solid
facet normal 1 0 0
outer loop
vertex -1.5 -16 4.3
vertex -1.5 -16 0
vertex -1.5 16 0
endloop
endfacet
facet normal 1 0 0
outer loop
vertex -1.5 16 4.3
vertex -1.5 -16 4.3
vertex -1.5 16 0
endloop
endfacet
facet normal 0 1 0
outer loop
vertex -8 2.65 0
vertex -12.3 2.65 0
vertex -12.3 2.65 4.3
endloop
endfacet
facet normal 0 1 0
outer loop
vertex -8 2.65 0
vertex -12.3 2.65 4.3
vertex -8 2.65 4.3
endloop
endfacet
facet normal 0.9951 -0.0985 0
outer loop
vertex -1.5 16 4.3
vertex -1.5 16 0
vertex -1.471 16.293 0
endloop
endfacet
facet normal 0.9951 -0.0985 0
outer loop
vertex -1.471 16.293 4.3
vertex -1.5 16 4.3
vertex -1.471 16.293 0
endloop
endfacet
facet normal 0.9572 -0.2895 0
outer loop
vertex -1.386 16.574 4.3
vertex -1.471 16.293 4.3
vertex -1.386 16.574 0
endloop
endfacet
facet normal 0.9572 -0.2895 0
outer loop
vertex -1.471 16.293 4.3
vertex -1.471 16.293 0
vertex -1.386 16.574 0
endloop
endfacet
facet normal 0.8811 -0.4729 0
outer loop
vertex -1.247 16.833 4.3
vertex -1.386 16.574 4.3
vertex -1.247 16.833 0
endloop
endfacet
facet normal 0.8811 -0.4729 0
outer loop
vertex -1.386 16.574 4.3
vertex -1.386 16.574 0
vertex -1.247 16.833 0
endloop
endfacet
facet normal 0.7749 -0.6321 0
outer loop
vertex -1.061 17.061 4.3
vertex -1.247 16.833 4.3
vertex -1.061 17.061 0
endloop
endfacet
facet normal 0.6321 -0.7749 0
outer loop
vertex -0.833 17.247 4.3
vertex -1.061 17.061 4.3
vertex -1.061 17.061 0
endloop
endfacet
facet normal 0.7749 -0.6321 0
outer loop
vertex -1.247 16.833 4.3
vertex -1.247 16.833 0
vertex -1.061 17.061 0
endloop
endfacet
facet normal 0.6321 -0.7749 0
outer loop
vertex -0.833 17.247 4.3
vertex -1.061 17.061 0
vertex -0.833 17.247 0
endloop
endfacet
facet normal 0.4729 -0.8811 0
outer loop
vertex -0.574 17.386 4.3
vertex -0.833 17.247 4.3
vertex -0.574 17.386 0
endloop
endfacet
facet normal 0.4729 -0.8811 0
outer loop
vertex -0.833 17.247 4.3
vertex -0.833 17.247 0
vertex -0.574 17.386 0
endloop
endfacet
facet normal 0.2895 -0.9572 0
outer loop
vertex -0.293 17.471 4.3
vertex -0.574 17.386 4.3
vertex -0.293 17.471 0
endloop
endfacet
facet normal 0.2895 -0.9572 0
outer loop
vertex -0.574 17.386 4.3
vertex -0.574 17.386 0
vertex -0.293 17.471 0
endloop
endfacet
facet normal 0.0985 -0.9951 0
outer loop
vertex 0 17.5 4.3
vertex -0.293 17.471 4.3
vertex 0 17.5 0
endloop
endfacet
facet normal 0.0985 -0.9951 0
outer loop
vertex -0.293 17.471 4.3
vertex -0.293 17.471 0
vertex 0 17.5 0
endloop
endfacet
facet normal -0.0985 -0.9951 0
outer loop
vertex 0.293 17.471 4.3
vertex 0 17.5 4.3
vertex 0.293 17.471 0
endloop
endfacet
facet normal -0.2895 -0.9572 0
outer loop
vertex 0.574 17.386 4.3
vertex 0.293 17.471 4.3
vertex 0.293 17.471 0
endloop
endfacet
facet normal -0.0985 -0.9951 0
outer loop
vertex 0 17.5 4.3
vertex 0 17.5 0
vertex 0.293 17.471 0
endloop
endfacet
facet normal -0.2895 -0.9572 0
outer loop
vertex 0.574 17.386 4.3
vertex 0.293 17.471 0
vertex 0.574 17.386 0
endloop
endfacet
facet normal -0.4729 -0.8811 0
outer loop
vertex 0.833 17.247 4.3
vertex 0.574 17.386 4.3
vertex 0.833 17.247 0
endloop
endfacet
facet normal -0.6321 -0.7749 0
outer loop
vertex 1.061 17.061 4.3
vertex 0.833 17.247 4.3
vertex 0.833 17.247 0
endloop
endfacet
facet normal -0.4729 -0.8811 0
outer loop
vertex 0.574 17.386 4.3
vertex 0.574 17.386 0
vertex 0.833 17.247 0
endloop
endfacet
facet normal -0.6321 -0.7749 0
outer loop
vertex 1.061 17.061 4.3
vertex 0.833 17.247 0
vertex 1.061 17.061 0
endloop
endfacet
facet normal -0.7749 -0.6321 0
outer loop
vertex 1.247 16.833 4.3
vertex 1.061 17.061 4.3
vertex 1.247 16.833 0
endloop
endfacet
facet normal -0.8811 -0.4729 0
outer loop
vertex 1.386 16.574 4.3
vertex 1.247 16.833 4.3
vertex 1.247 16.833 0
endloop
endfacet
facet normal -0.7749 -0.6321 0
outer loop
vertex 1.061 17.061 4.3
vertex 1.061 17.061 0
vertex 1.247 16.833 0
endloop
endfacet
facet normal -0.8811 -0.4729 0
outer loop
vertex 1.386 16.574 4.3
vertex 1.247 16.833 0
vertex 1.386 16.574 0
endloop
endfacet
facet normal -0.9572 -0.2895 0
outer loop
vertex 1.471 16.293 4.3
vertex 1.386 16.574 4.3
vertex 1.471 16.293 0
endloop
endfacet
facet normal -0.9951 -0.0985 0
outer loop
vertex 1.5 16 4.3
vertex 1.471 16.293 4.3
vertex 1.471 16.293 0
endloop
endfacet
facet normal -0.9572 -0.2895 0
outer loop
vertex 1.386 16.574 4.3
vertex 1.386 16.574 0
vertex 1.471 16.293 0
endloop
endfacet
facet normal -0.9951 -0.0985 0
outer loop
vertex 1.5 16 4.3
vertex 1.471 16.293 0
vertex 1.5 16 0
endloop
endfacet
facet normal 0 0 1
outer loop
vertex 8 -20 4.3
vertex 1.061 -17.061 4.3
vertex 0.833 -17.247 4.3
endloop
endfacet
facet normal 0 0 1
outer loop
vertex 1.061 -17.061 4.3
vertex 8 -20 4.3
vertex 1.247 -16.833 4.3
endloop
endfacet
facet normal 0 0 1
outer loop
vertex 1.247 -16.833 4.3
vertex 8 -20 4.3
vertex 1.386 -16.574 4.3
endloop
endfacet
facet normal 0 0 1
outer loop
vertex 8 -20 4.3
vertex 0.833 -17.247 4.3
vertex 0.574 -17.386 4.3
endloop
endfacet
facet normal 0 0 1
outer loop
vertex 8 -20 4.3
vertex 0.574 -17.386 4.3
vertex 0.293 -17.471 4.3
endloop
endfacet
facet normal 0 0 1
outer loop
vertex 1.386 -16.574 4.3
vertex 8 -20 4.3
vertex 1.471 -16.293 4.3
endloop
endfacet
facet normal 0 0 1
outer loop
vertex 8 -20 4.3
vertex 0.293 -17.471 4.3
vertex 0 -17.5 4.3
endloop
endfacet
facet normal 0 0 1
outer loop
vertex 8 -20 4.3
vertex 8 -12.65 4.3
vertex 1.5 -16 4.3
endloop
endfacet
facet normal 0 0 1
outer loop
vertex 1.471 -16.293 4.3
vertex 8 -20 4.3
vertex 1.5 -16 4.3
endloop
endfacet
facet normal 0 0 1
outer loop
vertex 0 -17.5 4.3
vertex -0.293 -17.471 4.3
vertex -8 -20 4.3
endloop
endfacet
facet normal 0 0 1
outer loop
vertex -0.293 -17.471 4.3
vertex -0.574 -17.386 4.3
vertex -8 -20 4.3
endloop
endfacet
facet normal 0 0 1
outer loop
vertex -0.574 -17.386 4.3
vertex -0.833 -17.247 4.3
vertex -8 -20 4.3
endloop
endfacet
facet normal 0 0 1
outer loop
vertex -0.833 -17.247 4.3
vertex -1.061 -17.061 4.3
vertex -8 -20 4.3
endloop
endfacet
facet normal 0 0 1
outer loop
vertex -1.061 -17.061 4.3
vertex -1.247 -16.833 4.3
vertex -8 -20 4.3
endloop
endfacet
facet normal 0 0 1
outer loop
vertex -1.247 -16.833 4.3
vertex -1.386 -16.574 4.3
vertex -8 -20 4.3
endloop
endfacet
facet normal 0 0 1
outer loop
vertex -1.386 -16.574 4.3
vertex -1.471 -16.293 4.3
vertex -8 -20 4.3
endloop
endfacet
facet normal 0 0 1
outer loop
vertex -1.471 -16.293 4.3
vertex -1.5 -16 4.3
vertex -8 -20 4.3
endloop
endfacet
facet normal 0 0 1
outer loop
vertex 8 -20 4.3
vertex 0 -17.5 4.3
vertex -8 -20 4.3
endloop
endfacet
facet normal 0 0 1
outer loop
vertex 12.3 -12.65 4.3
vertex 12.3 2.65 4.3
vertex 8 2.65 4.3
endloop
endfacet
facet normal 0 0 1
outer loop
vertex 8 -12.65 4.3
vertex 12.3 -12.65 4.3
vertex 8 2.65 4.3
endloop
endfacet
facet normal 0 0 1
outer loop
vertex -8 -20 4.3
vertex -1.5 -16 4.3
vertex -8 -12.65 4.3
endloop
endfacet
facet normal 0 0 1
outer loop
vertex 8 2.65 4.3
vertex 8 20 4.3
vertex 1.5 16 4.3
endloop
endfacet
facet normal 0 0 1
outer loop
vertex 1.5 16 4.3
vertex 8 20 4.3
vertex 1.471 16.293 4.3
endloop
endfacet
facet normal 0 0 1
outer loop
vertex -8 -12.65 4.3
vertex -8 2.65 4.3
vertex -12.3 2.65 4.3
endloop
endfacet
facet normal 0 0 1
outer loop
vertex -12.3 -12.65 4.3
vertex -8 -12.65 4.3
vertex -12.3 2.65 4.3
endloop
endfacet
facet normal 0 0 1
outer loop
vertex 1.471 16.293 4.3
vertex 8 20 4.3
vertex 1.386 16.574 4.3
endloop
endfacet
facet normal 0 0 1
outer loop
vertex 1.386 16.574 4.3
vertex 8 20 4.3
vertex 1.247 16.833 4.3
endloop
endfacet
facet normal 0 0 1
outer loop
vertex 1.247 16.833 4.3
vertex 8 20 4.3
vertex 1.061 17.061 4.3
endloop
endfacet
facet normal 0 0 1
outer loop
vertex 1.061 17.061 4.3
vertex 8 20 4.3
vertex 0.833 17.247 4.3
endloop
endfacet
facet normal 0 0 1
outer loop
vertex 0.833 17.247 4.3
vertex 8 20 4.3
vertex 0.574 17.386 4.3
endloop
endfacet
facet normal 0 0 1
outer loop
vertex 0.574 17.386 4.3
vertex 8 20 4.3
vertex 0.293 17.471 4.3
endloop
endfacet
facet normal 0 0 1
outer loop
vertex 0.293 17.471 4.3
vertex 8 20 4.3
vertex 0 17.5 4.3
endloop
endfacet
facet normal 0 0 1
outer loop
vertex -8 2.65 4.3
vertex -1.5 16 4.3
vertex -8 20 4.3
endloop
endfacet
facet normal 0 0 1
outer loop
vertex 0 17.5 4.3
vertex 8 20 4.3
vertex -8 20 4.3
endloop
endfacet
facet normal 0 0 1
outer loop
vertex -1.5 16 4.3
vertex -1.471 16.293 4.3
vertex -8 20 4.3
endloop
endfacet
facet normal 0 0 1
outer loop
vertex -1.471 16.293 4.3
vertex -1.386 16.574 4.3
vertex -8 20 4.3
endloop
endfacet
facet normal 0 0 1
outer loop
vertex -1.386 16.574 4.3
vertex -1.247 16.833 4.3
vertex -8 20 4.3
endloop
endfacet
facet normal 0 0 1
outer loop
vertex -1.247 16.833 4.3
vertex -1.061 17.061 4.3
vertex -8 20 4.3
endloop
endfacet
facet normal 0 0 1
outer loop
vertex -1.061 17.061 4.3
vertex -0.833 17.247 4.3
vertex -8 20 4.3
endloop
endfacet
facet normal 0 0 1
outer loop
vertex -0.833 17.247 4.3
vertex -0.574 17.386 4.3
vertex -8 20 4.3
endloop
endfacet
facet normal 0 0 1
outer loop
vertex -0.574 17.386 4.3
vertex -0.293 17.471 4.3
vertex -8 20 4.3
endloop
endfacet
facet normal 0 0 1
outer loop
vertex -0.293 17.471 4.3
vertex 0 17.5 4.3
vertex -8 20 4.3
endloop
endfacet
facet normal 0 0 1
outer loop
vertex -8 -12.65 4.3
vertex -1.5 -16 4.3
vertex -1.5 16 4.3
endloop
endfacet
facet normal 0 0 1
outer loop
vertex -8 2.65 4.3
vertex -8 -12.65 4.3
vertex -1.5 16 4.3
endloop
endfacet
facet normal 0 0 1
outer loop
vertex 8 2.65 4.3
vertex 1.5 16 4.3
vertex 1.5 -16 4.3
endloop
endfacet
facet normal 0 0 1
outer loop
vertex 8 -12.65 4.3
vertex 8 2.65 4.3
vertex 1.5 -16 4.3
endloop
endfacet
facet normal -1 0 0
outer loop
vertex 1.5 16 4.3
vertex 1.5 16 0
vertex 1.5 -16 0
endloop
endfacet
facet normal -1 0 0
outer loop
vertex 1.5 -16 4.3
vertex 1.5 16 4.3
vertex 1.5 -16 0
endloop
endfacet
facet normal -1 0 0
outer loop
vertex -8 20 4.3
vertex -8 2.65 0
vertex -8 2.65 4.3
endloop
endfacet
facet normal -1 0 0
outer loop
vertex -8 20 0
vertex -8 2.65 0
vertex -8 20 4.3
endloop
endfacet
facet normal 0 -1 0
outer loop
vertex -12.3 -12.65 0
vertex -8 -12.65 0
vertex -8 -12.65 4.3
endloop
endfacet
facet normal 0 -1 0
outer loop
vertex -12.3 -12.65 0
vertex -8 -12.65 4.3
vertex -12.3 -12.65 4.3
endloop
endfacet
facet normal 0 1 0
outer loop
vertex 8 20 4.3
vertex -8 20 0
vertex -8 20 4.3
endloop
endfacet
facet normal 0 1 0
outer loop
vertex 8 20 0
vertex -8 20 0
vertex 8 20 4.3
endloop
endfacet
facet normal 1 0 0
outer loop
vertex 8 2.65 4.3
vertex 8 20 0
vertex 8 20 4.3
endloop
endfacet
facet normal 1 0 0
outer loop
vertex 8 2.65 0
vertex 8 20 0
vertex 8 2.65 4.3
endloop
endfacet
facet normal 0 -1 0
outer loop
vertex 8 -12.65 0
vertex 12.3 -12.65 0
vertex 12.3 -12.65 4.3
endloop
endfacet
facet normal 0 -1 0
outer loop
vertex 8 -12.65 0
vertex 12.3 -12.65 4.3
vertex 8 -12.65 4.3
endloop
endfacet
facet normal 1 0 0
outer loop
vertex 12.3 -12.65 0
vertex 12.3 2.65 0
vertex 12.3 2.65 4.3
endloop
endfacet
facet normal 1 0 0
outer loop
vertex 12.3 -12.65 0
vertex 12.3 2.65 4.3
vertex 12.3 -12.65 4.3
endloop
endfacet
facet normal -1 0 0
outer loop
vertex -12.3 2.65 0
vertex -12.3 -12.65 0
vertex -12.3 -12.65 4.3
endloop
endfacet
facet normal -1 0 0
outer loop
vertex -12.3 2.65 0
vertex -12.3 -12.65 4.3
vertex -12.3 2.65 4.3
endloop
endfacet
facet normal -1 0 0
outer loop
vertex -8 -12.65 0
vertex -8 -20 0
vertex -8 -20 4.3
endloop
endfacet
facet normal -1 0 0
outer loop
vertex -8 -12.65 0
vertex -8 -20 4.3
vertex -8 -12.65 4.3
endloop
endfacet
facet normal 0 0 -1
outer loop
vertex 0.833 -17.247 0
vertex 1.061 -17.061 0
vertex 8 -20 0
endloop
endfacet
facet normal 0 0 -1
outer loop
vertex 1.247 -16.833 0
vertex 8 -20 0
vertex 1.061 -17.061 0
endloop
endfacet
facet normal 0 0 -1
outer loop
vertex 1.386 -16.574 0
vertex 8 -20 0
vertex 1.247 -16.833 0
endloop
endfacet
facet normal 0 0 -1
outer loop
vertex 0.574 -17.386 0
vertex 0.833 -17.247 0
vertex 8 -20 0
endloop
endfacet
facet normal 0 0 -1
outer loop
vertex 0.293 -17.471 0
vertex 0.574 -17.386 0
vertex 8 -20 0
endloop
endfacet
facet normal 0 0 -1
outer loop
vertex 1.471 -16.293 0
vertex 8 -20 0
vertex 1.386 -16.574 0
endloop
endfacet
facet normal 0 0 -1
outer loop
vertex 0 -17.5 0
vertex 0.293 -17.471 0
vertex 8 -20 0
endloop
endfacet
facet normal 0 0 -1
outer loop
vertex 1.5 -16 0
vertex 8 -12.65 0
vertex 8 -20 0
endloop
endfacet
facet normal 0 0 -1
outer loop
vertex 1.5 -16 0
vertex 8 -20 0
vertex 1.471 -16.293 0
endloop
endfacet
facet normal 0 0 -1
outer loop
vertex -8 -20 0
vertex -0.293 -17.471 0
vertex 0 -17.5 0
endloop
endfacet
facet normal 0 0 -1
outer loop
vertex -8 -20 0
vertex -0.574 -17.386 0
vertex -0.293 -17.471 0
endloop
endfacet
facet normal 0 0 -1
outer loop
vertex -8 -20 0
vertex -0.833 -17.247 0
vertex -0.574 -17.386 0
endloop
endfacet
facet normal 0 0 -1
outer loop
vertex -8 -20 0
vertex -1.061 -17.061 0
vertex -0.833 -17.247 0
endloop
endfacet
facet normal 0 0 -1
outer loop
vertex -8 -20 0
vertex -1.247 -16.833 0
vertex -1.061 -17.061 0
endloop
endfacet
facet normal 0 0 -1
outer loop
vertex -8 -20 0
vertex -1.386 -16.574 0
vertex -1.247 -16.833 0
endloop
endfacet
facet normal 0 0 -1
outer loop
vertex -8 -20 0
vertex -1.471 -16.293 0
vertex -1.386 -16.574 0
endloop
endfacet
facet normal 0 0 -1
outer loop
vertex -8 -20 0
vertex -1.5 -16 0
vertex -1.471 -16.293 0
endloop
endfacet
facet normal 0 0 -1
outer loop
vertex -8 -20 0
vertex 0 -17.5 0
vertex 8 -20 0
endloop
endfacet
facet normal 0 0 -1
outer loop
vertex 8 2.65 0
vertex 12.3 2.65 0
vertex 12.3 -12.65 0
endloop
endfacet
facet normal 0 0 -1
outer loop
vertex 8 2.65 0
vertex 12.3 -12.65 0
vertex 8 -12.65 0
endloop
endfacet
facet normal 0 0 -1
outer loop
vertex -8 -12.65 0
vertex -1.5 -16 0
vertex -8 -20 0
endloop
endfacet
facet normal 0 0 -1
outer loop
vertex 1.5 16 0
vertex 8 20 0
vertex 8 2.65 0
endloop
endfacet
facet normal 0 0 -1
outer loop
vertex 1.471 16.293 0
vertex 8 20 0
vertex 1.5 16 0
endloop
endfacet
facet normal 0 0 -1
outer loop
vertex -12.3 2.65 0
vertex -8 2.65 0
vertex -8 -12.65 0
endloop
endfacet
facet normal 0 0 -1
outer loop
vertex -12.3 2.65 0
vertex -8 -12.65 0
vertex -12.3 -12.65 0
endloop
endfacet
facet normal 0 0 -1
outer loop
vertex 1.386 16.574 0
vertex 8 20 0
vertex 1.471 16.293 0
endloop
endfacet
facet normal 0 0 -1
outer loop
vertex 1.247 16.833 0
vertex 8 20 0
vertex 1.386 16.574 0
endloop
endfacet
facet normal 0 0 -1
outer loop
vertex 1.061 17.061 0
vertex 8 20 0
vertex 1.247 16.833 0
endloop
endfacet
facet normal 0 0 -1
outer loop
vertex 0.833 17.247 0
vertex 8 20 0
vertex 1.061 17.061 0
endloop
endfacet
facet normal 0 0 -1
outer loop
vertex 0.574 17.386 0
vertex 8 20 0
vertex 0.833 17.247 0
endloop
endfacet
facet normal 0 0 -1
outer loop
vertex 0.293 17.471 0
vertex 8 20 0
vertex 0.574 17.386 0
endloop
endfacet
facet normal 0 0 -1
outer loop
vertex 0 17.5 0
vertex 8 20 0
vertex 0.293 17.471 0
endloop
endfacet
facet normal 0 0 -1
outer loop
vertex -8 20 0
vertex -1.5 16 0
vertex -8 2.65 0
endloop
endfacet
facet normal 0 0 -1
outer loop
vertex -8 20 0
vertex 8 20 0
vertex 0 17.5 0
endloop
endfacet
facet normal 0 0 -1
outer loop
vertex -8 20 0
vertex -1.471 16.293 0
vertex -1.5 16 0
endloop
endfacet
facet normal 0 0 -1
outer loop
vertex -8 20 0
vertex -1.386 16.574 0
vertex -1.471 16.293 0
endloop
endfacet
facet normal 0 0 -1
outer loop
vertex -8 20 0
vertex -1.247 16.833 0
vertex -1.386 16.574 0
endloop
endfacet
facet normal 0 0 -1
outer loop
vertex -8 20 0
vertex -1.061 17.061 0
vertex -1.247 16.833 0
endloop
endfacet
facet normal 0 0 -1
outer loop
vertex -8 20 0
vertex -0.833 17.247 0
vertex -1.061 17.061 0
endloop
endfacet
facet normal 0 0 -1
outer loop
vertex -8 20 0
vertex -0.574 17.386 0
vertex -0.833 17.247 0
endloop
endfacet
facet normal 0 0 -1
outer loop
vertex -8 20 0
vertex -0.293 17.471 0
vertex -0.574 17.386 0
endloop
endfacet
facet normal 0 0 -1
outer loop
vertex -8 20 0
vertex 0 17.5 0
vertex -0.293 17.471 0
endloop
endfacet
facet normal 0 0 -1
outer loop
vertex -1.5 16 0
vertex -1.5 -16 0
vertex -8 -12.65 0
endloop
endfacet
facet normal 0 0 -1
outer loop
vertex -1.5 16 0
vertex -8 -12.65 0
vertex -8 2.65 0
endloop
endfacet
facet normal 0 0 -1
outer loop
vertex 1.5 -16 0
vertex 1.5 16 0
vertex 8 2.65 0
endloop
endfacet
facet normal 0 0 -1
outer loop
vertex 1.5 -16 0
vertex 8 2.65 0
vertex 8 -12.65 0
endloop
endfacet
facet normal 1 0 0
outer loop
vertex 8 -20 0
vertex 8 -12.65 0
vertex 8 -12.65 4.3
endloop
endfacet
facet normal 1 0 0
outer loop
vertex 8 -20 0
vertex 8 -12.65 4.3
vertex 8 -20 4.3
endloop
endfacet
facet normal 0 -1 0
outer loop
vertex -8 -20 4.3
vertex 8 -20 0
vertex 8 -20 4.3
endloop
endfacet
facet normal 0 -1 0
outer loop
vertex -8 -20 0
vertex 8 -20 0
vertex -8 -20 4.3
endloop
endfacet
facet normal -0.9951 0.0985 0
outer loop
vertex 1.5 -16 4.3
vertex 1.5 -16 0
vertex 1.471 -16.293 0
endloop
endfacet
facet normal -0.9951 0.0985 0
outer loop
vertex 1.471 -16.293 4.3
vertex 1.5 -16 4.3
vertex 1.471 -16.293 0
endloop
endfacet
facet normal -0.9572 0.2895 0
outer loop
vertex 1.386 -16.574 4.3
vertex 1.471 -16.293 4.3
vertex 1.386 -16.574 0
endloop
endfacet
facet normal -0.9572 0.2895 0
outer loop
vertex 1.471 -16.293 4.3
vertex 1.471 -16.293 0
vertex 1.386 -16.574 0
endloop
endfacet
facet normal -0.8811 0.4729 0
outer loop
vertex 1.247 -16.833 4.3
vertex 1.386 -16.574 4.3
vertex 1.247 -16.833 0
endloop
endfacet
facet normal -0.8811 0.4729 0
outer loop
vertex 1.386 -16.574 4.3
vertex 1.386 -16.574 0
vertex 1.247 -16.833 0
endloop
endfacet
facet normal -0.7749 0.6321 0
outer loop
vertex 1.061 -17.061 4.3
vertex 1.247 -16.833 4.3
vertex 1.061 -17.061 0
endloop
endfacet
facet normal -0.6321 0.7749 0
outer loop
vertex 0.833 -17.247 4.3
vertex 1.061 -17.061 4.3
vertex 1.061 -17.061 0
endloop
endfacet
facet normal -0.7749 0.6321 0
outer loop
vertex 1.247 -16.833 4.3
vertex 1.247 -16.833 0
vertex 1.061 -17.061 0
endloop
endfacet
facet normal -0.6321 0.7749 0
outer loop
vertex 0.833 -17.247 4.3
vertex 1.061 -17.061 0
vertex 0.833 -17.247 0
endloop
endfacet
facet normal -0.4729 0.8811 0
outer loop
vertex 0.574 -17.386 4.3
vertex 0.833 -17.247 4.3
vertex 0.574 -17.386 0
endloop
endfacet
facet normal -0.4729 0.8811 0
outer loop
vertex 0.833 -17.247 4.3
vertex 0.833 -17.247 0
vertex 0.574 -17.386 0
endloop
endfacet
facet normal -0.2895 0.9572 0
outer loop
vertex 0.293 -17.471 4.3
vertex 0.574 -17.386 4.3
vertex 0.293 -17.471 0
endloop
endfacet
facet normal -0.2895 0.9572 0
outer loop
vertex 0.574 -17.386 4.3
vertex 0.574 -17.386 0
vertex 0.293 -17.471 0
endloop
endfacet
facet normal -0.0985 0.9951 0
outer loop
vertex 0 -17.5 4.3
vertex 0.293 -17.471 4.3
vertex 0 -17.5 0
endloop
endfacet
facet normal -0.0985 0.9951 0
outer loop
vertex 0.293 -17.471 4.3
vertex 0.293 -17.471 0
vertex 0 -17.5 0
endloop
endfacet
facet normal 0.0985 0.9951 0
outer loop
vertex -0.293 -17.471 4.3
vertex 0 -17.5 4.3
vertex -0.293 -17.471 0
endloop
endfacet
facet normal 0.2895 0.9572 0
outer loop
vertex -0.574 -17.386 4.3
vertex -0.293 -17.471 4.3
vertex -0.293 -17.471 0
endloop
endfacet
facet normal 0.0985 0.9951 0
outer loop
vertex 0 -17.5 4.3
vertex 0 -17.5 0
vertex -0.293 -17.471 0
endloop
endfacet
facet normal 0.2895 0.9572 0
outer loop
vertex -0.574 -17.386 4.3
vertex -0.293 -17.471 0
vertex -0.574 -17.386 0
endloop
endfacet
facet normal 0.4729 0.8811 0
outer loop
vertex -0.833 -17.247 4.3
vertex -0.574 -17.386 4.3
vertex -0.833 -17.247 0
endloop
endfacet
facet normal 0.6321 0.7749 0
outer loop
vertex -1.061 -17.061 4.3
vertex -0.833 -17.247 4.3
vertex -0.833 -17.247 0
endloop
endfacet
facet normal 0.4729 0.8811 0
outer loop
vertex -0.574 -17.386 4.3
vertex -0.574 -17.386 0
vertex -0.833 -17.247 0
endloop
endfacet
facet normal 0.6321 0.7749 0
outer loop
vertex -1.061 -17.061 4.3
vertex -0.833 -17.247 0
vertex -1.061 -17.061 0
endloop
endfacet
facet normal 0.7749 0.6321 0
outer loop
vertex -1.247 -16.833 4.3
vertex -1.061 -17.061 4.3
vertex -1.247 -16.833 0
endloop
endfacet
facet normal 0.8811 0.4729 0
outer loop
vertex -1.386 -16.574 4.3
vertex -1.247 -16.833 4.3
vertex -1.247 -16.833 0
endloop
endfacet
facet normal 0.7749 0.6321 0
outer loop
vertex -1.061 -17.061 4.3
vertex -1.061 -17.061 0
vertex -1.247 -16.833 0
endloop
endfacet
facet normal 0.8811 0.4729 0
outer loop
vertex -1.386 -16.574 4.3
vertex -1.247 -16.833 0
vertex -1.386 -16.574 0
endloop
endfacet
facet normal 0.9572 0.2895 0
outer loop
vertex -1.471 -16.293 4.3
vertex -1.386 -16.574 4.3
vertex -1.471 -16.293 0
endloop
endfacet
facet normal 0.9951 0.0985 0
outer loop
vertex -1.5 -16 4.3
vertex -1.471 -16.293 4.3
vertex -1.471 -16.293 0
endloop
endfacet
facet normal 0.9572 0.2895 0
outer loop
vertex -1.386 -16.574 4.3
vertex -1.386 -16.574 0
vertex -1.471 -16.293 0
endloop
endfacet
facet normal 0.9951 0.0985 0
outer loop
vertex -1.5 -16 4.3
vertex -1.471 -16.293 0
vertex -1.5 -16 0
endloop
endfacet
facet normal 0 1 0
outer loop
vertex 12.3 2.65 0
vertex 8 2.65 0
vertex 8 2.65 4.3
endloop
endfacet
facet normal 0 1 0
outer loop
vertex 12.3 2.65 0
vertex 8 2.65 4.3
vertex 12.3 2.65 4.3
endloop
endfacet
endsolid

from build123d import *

# Parameters (mm, degrees)
BOSS_EXTRUDE1_DEPTH = 4.3


with BuildPart() as part:
    # Sketch1 → Boss-Extrude1 (new body)
    with BuildSketch(Plane.XY):
        Polygon((-8, 2.65), (-8, 20), (8, 20), (8, 2.65), (12.3, 2.65), (12.3, -12.65), (8, -12.65), (8, -20), (-8, -20), (-8, -12.65), (-12.3, -12.65), (-12.3, 2.65), align=None)
        with BuildLine():
            Line((-1.5, -16), (-1.5, 16))
            ThreePointArc((-1.5, 16), (0, 17.5), (1.5, 16))
            Line((1.5, 16), (1.5, -16))
            ThreePointArc((1.5, -16), (0, -17.5), (-1.5, -16))
        make_face(mode=Mode.SUBTRACT)
    extrude(amount=BOSS_EXTRUDE1_DEPTH)


solid = part.part
